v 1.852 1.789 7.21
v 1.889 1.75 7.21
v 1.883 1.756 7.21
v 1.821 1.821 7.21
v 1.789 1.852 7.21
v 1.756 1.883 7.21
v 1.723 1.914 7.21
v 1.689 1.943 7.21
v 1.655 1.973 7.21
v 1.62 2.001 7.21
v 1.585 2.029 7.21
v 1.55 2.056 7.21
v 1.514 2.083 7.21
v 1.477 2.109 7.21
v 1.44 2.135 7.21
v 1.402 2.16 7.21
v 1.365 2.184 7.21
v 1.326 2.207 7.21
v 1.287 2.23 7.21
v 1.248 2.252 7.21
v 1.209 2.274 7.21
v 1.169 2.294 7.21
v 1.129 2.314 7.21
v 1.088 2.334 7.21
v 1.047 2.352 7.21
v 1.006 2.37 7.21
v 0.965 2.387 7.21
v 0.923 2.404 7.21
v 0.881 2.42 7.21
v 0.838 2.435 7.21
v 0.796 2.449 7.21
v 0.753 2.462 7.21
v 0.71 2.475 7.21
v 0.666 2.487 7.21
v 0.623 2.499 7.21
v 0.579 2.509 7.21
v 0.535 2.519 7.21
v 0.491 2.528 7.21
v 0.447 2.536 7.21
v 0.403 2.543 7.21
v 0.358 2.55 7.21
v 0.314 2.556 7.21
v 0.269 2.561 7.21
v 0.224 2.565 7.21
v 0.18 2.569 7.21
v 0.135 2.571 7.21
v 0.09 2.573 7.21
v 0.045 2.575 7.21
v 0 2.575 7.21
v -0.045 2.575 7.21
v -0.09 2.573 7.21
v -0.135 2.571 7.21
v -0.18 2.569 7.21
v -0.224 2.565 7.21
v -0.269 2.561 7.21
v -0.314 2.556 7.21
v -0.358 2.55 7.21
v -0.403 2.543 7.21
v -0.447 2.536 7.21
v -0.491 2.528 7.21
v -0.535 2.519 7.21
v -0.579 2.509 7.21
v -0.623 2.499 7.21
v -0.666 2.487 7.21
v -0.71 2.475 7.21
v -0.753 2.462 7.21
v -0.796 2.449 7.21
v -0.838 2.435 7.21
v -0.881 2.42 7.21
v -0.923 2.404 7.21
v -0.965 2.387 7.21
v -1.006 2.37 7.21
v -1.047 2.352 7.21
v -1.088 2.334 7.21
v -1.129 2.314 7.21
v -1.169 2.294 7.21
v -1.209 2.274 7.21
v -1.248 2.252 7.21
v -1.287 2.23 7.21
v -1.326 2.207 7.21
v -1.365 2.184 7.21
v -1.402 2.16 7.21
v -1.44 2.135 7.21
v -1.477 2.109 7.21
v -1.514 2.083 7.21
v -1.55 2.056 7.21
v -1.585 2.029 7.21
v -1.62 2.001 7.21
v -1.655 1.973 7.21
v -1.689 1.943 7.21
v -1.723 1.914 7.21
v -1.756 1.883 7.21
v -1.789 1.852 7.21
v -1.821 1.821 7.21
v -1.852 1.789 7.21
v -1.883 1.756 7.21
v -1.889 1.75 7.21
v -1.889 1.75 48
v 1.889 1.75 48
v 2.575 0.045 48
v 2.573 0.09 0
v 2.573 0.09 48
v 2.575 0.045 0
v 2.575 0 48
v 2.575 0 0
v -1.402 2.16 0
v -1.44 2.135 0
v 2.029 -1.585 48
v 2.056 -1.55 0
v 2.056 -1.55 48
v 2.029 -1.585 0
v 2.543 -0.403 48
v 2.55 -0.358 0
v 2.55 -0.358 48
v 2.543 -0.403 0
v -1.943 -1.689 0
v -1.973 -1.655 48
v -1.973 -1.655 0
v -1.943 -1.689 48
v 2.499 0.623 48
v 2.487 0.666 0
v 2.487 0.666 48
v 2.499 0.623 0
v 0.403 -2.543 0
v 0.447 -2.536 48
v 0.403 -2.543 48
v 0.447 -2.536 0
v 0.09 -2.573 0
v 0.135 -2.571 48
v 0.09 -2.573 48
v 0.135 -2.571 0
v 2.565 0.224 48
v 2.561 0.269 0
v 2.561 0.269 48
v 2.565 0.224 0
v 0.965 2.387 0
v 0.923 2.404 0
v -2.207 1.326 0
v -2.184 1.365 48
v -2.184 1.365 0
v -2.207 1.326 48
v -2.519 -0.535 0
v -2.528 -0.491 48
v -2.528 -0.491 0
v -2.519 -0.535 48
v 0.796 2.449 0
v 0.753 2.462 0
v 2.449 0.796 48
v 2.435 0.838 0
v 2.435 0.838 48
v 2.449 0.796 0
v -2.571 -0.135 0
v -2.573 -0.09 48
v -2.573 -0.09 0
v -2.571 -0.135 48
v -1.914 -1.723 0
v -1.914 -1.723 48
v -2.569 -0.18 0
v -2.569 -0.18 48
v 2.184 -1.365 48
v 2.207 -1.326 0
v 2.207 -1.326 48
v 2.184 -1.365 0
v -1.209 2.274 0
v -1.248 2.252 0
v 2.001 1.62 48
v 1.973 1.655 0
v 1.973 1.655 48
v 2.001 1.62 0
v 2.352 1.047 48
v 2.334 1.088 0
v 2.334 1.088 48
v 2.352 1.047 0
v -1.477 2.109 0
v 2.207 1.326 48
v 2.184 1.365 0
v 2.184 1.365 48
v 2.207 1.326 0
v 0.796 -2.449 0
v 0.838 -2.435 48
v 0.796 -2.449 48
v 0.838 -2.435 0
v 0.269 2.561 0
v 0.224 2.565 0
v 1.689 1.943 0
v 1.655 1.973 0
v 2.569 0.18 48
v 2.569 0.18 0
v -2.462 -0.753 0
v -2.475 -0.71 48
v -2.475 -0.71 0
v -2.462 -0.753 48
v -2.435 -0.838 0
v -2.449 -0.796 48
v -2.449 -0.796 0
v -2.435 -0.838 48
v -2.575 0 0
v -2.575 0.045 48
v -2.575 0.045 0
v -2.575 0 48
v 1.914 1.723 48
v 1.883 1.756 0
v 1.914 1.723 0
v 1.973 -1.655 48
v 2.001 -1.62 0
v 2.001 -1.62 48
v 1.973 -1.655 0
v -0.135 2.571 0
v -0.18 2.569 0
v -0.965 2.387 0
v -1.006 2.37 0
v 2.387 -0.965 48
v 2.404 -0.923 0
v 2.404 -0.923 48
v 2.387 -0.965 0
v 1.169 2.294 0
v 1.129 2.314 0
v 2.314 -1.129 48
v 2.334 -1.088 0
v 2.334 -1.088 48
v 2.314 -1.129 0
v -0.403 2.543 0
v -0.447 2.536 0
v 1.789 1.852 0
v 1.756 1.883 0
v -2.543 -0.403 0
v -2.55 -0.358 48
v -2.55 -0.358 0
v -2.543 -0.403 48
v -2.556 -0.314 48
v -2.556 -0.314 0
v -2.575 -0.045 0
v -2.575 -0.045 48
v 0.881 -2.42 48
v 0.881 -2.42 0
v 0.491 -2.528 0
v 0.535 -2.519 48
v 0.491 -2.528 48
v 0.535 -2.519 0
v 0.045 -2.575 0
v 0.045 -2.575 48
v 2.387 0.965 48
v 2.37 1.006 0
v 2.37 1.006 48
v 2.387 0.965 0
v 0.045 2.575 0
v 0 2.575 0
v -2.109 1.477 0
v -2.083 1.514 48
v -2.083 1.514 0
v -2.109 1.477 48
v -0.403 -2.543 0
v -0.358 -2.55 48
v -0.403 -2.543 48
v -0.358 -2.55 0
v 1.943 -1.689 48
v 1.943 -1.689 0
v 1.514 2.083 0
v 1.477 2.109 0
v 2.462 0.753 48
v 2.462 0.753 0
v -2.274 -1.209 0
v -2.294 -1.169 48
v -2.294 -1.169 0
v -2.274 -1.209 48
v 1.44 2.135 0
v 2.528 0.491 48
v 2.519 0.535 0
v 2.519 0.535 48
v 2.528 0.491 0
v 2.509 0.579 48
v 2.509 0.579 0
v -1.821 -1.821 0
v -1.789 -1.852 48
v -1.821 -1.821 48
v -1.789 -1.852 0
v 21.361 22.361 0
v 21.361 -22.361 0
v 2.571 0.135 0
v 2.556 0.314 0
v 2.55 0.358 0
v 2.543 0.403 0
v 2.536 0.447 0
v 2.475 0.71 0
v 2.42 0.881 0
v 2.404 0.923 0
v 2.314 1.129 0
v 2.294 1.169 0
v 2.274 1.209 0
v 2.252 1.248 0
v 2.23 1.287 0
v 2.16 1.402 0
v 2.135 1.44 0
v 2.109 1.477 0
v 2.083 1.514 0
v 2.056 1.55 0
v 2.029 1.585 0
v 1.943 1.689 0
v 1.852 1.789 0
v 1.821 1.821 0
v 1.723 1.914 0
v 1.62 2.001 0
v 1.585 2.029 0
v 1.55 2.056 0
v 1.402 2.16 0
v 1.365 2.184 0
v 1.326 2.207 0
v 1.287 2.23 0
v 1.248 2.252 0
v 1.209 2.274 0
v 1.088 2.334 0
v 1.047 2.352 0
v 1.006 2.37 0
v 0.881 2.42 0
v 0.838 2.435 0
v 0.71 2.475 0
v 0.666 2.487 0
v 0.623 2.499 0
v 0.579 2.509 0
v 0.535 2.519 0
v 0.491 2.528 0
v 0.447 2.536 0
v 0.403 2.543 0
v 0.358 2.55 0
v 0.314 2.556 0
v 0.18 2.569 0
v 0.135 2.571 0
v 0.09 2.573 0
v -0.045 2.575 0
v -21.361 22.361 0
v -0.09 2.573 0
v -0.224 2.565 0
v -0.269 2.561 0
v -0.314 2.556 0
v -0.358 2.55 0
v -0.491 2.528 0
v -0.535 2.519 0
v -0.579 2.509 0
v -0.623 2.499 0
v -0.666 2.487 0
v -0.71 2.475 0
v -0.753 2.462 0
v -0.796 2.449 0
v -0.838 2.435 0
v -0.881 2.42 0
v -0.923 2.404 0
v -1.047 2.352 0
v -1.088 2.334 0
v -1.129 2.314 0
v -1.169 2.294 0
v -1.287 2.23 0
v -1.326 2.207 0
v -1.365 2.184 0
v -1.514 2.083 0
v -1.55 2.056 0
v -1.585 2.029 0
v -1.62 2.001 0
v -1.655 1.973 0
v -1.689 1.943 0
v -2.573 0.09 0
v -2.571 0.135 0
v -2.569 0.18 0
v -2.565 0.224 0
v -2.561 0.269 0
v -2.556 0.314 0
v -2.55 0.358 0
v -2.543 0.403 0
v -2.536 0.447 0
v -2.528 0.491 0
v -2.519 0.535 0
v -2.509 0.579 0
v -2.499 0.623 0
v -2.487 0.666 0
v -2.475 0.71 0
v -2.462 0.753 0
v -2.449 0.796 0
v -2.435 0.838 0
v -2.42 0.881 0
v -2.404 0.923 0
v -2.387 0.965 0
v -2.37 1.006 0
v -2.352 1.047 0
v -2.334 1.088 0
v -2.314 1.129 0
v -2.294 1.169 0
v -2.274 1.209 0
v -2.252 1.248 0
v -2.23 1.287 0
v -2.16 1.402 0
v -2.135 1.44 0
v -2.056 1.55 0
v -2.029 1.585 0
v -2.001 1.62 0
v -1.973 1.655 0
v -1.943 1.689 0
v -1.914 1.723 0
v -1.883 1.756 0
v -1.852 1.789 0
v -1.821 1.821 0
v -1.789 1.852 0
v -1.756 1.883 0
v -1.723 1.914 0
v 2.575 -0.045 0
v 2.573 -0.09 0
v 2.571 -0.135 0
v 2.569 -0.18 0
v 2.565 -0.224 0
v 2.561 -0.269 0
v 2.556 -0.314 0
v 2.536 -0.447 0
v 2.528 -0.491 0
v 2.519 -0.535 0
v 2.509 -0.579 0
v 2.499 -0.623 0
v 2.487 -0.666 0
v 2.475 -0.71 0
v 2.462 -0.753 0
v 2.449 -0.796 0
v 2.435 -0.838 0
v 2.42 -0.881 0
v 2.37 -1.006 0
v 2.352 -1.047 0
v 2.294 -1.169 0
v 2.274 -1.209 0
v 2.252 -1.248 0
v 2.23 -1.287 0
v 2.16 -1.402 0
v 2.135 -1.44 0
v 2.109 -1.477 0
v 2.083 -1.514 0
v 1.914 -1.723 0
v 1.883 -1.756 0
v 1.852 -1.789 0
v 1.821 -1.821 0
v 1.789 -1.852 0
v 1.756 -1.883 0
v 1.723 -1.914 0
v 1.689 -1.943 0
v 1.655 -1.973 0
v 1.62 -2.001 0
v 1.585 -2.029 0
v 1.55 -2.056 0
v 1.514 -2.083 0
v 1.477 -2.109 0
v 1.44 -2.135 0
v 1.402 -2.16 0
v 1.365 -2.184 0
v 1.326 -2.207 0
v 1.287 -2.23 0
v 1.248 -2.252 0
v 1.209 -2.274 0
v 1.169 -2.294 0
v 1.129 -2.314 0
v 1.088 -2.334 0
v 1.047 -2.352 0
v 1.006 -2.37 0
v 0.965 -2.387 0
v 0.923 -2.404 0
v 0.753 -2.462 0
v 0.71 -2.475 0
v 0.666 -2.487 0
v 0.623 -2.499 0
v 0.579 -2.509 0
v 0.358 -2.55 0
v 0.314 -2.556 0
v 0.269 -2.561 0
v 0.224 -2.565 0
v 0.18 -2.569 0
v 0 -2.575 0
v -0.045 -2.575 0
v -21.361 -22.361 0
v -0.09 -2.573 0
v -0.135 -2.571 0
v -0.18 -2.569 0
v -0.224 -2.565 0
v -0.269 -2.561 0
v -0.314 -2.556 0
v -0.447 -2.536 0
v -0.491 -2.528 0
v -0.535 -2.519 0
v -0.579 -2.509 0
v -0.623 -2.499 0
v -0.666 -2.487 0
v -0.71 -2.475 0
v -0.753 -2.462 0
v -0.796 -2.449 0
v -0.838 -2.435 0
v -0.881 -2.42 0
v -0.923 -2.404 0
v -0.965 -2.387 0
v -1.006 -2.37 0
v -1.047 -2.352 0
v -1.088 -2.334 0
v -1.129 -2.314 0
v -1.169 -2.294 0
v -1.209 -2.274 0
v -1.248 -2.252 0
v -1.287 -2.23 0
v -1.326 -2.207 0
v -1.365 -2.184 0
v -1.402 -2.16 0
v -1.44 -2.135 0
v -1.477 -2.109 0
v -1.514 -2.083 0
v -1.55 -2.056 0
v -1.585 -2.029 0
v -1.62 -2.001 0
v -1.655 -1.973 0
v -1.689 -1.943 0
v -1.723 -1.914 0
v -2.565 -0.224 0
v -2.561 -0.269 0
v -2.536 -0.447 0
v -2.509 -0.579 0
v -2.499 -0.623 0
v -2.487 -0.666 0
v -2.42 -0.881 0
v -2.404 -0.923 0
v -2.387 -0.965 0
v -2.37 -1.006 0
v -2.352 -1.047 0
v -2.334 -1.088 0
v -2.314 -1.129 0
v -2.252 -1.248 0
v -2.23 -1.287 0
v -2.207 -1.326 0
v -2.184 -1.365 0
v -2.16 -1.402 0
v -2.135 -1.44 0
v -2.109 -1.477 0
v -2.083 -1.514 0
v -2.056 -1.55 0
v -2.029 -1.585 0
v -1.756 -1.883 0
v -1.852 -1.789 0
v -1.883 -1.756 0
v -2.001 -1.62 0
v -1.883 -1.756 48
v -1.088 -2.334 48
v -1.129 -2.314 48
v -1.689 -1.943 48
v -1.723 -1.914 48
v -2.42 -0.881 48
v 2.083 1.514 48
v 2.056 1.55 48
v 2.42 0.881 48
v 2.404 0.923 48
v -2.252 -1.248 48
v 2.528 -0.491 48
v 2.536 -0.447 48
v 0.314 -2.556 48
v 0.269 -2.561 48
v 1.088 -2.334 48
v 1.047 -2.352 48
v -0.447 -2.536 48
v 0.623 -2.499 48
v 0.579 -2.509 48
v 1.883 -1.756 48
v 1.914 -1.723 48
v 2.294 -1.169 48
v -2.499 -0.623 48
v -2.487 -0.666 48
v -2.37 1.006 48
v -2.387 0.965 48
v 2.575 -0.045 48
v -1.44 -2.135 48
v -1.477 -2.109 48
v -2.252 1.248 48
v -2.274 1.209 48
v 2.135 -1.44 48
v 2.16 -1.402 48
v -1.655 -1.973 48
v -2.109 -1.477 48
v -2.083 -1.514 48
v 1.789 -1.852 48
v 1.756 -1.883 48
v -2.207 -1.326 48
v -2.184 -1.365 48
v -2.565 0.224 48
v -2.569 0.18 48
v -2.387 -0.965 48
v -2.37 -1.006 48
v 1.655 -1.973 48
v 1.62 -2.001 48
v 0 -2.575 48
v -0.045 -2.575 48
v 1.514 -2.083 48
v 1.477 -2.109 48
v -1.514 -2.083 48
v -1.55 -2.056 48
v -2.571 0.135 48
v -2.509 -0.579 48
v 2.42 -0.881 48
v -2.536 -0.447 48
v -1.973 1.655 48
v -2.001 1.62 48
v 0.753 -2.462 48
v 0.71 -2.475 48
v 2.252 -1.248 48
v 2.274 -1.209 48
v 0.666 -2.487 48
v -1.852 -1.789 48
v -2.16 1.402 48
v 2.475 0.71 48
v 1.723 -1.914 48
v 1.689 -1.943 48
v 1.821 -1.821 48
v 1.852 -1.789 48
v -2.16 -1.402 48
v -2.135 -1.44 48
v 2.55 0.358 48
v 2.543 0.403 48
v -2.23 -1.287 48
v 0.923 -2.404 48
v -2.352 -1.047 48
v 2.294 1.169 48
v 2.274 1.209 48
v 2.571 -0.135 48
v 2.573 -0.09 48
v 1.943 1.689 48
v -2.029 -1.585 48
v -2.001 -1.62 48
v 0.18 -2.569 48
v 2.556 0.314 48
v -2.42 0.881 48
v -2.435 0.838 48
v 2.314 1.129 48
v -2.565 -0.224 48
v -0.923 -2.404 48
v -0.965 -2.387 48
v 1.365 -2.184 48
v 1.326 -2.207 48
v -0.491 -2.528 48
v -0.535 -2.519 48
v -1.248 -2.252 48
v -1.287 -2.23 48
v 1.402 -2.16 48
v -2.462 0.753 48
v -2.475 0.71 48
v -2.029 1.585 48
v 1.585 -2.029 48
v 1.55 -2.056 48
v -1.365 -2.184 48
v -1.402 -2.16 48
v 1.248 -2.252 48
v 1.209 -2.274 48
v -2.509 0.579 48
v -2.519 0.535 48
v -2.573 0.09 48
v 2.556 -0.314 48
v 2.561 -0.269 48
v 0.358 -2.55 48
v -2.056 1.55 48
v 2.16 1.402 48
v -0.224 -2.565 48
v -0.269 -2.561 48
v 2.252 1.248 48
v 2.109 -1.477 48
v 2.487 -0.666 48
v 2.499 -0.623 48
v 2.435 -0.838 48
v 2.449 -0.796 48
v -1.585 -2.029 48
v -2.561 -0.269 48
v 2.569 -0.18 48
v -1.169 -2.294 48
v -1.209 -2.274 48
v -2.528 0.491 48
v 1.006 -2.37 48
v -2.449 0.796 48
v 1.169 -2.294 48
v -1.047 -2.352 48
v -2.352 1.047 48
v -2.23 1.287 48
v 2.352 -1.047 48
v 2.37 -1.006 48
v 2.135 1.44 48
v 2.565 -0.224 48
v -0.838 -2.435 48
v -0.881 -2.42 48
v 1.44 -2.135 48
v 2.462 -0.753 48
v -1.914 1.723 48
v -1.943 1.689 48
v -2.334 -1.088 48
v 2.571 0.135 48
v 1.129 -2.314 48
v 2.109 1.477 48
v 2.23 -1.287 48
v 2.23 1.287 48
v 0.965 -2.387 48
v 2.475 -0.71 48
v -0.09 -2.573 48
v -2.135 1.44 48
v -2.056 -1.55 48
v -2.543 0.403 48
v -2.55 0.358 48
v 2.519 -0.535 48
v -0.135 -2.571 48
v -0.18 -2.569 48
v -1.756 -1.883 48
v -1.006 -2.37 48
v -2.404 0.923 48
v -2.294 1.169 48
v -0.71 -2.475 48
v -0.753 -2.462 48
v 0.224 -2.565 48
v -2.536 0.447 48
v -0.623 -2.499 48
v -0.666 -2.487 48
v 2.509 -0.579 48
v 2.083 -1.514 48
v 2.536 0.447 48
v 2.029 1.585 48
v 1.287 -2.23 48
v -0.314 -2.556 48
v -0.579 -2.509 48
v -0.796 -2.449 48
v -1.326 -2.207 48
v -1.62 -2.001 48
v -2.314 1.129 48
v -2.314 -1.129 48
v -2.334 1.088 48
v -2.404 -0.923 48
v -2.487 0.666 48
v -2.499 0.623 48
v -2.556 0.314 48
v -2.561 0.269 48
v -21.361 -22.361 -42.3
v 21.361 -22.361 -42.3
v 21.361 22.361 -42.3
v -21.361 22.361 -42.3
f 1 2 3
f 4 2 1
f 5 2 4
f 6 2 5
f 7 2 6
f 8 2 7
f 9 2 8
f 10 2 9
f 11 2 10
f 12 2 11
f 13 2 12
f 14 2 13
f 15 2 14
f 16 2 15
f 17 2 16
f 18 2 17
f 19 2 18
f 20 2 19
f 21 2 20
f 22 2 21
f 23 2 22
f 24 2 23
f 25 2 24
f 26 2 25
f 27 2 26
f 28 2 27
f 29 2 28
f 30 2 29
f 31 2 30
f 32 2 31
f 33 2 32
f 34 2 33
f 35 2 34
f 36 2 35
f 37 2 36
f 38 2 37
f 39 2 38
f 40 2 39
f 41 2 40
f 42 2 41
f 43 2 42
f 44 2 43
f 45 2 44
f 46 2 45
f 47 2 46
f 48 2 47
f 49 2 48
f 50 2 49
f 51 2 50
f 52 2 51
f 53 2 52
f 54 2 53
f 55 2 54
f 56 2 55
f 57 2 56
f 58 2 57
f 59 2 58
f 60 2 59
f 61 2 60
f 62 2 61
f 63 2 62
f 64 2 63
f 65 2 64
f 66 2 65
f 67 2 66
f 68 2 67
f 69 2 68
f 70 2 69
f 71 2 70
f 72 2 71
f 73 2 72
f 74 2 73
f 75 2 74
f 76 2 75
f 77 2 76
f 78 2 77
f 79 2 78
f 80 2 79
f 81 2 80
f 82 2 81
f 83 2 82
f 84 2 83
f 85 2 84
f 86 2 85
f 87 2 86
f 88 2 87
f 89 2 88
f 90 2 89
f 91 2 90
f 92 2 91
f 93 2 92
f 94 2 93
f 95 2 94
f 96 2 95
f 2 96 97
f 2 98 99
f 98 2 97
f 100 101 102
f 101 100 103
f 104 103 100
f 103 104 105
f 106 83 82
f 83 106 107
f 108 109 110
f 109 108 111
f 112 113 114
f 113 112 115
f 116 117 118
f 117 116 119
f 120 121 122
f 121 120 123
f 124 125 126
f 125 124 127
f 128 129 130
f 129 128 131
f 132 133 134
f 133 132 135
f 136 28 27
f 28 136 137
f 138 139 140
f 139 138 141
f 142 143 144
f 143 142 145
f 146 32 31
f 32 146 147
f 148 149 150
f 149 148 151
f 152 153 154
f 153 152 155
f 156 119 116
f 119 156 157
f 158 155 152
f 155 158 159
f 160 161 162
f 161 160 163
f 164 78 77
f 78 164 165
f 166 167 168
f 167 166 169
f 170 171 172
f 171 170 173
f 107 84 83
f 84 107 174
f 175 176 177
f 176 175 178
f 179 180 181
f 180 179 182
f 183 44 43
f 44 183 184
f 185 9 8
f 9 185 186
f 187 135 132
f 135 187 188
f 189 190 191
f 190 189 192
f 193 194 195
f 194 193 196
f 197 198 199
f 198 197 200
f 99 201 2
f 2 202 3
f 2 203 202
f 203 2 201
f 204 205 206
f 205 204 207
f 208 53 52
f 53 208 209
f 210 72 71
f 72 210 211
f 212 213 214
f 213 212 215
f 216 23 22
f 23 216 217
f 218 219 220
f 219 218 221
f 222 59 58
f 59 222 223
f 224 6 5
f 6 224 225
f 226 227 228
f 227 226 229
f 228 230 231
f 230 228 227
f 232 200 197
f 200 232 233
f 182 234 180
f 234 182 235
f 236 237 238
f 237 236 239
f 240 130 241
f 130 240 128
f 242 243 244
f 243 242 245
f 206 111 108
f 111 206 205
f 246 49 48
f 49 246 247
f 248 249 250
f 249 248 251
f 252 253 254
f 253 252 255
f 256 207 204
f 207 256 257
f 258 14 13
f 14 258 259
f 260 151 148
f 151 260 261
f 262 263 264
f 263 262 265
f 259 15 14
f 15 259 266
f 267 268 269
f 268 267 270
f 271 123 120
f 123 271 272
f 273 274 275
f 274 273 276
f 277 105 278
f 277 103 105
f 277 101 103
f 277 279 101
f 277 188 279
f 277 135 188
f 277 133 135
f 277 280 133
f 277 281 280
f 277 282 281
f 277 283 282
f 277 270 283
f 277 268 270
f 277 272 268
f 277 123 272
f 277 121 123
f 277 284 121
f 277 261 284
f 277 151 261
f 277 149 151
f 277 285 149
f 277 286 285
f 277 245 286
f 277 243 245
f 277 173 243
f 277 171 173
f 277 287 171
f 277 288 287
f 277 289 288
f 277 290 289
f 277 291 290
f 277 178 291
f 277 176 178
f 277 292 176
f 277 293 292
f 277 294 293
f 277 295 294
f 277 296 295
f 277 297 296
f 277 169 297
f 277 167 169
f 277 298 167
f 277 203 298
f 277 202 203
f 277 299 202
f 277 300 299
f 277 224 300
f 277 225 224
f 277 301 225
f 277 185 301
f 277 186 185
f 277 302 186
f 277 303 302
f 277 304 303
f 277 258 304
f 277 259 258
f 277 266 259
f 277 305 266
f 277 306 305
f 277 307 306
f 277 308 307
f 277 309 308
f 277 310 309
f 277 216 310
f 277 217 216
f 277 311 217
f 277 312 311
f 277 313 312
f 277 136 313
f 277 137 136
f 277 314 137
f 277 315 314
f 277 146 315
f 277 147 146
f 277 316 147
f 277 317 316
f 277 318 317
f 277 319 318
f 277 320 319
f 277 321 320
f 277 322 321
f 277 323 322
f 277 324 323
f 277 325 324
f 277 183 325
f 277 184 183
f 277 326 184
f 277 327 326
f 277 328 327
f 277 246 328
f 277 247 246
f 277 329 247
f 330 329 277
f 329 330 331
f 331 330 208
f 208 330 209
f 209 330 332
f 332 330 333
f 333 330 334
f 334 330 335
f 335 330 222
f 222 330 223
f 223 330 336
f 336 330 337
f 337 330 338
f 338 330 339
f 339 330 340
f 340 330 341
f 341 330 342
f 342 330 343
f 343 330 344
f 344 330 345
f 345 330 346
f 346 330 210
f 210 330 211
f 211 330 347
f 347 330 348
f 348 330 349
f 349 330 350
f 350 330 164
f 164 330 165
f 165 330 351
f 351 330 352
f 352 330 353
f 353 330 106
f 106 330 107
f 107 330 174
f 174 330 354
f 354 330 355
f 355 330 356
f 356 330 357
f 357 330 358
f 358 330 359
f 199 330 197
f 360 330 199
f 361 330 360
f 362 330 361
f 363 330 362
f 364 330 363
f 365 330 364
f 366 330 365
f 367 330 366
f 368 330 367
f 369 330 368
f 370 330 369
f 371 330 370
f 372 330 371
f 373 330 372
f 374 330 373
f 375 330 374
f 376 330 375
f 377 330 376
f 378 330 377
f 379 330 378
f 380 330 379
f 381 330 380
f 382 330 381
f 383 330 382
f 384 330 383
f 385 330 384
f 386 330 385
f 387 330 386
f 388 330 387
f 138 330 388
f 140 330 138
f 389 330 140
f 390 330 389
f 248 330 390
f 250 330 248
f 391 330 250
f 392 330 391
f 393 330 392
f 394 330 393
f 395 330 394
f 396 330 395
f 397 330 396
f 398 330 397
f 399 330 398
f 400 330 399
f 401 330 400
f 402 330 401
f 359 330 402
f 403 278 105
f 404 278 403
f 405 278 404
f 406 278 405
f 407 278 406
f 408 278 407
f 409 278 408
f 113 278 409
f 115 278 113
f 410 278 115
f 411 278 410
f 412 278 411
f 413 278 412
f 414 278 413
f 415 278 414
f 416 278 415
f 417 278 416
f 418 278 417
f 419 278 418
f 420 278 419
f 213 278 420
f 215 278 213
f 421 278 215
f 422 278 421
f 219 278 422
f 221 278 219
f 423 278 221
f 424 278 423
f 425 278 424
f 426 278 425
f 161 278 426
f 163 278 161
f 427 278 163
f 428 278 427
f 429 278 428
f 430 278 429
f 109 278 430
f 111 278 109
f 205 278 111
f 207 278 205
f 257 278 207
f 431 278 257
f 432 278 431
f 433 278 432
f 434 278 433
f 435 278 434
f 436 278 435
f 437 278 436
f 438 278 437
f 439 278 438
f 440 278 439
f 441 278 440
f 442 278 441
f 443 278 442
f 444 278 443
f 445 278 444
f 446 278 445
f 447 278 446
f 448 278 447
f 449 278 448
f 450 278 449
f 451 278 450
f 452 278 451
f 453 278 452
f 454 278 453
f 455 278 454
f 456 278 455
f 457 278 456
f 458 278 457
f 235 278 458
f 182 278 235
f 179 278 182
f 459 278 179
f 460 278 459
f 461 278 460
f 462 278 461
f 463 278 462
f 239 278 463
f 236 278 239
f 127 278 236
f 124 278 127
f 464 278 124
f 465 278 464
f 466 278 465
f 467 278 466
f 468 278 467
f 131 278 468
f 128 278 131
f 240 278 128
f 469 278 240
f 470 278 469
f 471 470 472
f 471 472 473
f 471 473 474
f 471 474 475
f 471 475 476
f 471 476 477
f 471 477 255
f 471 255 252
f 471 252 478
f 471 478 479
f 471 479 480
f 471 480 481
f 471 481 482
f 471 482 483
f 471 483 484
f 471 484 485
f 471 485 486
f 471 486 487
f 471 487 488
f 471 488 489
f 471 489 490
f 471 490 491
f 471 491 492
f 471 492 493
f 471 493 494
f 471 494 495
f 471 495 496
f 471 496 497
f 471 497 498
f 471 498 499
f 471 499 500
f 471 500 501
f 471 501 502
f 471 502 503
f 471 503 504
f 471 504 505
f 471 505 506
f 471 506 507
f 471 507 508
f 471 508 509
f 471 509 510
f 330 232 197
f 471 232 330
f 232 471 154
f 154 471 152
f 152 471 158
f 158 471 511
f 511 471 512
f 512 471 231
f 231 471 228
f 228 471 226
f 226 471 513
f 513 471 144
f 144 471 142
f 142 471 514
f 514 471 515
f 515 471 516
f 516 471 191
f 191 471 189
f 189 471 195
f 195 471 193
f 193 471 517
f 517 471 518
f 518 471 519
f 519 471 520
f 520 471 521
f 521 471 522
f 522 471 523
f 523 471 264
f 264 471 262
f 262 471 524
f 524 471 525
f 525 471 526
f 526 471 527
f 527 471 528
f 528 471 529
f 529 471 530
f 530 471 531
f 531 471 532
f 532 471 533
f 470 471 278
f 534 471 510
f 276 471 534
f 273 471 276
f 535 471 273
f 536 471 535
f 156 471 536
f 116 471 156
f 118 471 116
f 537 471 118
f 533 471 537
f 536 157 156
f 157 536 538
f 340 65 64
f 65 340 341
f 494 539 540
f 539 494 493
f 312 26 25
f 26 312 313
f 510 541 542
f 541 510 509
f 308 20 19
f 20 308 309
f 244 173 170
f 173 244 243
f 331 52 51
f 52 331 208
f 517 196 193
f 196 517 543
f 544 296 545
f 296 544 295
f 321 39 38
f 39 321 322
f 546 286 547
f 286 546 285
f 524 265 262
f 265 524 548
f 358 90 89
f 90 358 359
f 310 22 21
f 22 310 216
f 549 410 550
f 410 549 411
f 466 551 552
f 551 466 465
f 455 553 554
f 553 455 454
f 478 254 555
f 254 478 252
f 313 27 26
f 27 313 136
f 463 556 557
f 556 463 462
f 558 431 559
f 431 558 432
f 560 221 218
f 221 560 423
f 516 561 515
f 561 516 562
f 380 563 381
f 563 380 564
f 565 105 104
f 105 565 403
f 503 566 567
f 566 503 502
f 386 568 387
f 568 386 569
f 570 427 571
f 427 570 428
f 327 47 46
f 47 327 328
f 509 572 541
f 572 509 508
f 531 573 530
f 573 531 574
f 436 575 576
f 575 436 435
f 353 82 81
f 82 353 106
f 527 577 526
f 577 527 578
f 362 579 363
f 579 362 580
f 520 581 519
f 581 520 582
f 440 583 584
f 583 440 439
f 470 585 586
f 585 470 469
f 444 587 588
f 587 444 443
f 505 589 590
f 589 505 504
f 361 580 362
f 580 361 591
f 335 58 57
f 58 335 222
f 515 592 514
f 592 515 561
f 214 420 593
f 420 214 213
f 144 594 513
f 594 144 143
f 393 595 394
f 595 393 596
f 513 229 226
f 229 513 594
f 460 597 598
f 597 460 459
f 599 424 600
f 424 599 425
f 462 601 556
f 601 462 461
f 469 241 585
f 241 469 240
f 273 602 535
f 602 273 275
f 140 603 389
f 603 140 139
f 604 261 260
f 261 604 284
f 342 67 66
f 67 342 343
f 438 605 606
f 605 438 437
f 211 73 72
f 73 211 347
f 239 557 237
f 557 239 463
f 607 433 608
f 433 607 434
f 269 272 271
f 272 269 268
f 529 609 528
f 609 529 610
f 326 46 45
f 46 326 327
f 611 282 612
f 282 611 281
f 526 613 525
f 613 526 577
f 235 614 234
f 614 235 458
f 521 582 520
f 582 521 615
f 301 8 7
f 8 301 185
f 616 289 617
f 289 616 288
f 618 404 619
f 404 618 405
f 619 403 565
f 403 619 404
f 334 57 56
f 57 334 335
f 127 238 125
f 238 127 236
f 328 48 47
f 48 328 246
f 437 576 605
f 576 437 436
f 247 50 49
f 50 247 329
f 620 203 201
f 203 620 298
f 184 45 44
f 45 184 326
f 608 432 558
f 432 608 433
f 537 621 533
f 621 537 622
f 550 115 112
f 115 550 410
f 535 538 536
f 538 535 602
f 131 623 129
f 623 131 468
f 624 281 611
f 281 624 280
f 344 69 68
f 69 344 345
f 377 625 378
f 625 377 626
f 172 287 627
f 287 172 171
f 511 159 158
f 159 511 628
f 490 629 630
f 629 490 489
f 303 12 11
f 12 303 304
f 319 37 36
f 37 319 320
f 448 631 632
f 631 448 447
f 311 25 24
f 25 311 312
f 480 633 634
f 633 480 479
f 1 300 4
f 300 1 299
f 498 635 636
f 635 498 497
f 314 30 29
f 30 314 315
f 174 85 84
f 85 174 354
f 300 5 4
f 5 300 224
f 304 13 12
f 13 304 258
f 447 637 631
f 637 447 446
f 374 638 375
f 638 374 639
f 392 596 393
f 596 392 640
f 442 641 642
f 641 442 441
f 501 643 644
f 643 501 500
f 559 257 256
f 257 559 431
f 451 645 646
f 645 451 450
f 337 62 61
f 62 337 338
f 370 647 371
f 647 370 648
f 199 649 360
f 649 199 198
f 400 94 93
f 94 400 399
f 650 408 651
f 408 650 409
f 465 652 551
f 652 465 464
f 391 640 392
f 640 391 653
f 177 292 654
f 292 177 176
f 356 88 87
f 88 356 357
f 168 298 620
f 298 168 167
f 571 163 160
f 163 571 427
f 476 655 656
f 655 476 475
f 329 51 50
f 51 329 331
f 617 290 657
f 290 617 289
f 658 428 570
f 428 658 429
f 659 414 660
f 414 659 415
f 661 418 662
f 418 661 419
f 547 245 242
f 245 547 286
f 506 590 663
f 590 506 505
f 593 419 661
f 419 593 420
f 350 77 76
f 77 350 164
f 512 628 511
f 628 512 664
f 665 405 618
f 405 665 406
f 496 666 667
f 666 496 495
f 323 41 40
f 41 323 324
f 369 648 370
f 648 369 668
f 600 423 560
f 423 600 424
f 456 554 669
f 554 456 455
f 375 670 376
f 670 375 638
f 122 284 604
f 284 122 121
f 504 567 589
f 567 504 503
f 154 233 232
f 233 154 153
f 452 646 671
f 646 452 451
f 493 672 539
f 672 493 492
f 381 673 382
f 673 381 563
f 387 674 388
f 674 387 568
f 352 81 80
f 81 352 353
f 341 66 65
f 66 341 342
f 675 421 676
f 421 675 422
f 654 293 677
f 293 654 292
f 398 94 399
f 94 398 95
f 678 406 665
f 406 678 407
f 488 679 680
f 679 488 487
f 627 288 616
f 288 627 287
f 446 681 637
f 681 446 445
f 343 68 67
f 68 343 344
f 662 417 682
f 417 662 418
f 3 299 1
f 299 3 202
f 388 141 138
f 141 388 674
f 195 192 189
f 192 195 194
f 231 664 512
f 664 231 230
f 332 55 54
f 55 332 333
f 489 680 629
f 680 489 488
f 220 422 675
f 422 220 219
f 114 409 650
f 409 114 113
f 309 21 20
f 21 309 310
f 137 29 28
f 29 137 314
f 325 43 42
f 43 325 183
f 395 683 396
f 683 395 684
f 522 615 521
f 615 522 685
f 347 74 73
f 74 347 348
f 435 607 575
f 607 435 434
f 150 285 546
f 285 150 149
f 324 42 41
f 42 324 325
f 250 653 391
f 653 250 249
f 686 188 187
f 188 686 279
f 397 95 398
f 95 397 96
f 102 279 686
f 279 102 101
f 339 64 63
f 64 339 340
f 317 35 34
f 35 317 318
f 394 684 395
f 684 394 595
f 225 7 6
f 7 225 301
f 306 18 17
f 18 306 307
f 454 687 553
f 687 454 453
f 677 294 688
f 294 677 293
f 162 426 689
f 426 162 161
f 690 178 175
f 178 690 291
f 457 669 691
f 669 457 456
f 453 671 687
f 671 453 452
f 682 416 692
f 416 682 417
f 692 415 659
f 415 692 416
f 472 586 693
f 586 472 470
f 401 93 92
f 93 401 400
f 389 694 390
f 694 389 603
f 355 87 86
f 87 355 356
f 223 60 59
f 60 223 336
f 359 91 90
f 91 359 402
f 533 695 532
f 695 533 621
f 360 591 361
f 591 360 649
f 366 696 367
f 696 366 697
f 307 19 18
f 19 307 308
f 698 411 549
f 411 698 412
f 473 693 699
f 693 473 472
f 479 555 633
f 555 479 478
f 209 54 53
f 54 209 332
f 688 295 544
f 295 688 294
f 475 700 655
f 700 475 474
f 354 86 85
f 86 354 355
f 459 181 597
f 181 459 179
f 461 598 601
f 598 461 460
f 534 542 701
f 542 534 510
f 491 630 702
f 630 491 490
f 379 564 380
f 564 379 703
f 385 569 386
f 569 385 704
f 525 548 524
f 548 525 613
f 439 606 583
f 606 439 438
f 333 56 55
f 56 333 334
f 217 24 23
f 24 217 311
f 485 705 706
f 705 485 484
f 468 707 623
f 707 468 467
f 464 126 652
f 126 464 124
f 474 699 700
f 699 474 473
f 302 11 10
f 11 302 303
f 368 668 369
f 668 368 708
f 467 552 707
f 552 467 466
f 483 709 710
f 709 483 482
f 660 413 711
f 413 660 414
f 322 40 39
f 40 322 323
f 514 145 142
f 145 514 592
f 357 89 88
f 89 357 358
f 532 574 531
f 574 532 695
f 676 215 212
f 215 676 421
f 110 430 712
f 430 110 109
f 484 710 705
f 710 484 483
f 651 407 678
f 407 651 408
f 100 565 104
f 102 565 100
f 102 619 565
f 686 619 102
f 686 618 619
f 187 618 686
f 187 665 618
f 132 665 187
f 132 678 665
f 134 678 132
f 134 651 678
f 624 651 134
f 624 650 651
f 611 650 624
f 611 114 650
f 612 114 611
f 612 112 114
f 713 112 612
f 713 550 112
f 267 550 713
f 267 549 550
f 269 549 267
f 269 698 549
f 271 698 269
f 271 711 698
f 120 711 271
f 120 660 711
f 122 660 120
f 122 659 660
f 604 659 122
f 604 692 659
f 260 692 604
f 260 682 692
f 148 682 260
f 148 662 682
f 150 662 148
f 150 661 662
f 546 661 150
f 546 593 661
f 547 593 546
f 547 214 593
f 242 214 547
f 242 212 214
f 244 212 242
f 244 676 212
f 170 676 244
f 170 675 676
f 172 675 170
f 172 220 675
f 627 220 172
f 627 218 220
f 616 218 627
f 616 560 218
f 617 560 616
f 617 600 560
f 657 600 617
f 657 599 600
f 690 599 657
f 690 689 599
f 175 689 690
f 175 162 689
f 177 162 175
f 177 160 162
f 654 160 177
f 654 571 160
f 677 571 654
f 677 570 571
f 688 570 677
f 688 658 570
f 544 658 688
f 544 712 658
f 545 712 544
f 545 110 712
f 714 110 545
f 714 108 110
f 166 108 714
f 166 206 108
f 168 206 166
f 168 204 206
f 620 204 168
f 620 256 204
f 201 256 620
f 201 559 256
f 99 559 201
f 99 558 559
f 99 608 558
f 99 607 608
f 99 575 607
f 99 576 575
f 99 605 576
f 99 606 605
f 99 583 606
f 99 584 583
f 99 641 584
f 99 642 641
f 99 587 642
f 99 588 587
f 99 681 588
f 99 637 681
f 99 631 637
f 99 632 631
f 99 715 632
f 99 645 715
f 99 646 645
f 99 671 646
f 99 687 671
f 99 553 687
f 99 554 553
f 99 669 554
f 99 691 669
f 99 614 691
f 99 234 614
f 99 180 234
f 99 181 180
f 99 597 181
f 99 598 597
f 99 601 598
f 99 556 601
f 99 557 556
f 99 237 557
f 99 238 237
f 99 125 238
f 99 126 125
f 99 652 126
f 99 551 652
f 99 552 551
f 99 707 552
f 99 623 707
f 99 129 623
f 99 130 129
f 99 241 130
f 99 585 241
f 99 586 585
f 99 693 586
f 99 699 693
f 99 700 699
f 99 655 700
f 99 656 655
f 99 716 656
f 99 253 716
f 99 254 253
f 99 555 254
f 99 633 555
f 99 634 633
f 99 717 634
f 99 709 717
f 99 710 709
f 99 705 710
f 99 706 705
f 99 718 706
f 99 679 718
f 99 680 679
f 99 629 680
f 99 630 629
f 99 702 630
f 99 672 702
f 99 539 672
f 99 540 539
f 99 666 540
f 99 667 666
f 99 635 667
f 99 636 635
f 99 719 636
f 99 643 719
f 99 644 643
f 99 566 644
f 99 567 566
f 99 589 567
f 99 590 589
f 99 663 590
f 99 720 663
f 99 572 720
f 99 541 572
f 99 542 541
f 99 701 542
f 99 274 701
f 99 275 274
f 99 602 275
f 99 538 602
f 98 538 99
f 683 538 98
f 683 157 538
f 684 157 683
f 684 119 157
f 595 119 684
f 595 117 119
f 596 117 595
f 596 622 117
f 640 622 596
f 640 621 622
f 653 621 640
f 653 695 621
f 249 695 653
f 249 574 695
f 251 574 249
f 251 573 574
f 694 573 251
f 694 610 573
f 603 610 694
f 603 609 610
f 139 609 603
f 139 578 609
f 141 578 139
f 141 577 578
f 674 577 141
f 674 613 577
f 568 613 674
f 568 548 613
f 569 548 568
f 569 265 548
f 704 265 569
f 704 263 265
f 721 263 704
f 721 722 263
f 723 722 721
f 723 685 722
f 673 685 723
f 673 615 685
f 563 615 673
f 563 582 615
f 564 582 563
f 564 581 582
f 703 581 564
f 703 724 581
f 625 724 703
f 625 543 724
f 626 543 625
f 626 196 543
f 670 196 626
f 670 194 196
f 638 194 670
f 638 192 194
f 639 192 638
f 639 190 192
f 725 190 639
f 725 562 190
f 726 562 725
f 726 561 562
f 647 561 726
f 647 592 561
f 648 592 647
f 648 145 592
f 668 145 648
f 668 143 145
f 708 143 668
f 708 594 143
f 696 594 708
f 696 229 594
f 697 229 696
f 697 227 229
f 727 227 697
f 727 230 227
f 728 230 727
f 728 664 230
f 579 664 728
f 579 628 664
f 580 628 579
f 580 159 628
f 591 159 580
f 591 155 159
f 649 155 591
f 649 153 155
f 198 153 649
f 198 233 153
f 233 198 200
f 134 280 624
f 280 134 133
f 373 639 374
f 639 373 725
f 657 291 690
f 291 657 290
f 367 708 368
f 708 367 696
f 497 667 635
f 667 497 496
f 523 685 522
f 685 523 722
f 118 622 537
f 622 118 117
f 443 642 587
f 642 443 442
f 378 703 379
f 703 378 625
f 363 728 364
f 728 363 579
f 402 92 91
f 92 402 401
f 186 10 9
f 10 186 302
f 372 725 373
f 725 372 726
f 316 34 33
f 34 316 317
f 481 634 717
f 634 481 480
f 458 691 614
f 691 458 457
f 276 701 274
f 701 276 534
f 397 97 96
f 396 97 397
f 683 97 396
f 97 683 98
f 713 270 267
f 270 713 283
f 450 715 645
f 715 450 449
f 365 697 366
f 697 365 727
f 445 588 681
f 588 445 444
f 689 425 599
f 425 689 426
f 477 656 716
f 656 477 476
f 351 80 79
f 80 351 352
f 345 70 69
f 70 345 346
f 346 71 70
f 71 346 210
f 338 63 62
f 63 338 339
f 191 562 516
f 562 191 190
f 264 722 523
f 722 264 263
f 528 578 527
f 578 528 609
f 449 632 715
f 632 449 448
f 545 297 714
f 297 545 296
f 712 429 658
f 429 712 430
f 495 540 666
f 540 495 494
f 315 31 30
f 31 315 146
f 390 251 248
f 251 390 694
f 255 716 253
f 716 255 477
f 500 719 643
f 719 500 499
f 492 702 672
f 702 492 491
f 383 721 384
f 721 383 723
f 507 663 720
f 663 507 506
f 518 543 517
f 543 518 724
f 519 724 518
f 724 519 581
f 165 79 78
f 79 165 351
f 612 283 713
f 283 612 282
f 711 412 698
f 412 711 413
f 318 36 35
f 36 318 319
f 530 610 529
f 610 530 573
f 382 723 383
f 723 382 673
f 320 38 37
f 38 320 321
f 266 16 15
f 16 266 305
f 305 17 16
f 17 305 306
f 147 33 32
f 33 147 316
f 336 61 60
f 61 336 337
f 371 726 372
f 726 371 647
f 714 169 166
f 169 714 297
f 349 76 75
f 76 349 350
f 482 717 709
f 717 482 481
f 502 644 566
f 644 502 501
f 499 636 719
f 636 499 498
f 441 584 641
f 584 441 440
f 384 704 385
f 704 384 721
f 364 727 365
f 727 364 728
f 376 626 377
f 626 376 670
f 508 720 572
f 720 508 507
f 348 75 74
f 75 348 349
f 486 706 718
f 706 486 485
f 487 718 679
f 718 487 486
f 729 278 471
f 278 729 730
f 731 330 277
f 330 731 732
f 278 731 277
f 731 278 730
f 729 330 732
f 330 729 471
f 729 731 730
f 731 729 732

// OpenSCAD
// file: mirrorcopy.scad
module mirrorCopy(vec=[1,0,0], vec2=[0,0,0], vec3=[0,0,0]){
    
    //echo(str("Vec1=",vec," Vec2=", vec2, " Vec3=", vec3));
    children();
    mirror(vec) children();

    if(vec2){    
        mirror(vec2){
            children();
            mirror(vec) children();
        }
    }

    if(vec3){
        mirror(vec3){
            children();
            mirror(vec) children();
            mirror(vec2){
                children();
                mirror(vec) children();
            }
        }
    }
    
} 

mirrorCopy([1,0,0])color("green")translate([5,10,0])cylinder(h=1,d=5,center=true);
mirrorCopy([1,0,0],[0,1,0])color("blue")translate([10,5,0])cylinder(h=1,d=5,center=true);
mirrorCopy([1,0,0],[0,1,0],[0,0,1])color("red")translate([15,10,5])cylinder(h=1,d=5,center=true);
// main file
/**
 * Implementation of a model of a 28BYJ-48 type cheapo stepper motor
 */
use <mirrorcopy.scad>;
module stepper28BYJ48(){
    color("lightgrey"){
        translate([0,-8,0]){
            // Motor body
            translate([0,0,(19/2)*-1]){
                cylinder(d=28,h=19, center=true);
            }

            // Motor snooter
            translate([0,8,0]){
                translate([0,0,(1.5/2)])cylinder(d=9,h=1.5, center=true);
                difference(){
                    translate([0,0,(5/2)+2])cylinder(d=5,h=6, center=true);
                    mirrorCopy([0,1,0]){
                        translate([0,4,(5/2)+2.1])cube([5,5,6.2], center=true);
                    }
                }
            }
            
            // cable gland
            translate([0,(17/2)*-1,(19/2)*-1]){
                cube([14.8,17,19], center=true);
            }
            
            // Attachment crossbar
            difference(){
                hull(){
                    mirrorCopy([1,-0,0]){
                        translate([(35/2),0,(1/2)*-1]){
                            cylinder(h=1,d=7, center=true);
                        }
                    }
                }
                mirrorCopy([1,-0,0]){
                    translate([(35/2),0,(1/2)*-1]){
                        cylinder(h=1+0.01,d=4.2, center=true);
                    }
                }
            }
        }
    }
}


module stepper28BYJ48_cutouts(){
    color("orange"){
        translate([0,-8,0]){
            mirrorCopy([1,-0,0]){
                translate([(35/2),0,(1/2)*-1]){
                    cylinder(h=1+0.01,d=4.2, center=true);
                }
            }
        }
    }
}

module nemaCutout(shaftClearance, shaftGirth, shaftLength, frameSize, holeSpacing,holeDiameter=3,       nemaSlotSlackMM=0, shaft=false){
    translate([0,0,frameSize/-2]){
        hull(){
            mirrorCopy([0,1,0]){
                translate([0,nemaSlotSlackMM/2]){
                    cube([frameSize*1.01,frameSize*1.01,frameSize], center=true);
                }
            }
        }
    }
    if(!shaft){
        translate([0,0,10/2]){
            mirrorCopy([1,0,0]){
                mirrorCopy([0,1,0]){
                    translate([holeSpacing/2,holeSpacing/2,0]){
                        hull(){
                            mirrorCopy([0,1,0]){
                                translate([0,nemaSlotSlackMM/2,0]){
                                    cylinder(d=holeDiameter*1.1,h=30,center=true);
                                }
                            }
                        }
                    }
                }
            }
        }
    }
    
    if(!shaft){
        translate([0,0,-0.5]){
            cylinder(d=shaftClearance*1.03,h=shaftLength+1);
        }
    }else{
        difference(){
            cylinder(d=shaftGirth*1.03,h=shaftLength*2, $fn=360);
            translate([frameSize/-2,(shaftGirth/2)-(shaftGirth)*0.15,shaftLength*0.3+0.01]){
                cube([frameSize,frameSize/2,shaftLength*0.70]);
                translate([0,0,shaftLength*0.70-1])cube([frameSize,frameSize/2,shaftLength+1]);
            }
        }
    }
}

module nema14_cutout(){
    nemaCutout(22,5,24,35,26,3,2, shaft);
}

module nema17_cutout(shaft=false){
    
    nemaCutout(22,5,24,42.3,31,3,2, shaft);
}

module nema23_cutout(shaft=false){
    //nemaCutout(, shaft);
}
nema17_cutout(true);
//nema23_cutout(true);
